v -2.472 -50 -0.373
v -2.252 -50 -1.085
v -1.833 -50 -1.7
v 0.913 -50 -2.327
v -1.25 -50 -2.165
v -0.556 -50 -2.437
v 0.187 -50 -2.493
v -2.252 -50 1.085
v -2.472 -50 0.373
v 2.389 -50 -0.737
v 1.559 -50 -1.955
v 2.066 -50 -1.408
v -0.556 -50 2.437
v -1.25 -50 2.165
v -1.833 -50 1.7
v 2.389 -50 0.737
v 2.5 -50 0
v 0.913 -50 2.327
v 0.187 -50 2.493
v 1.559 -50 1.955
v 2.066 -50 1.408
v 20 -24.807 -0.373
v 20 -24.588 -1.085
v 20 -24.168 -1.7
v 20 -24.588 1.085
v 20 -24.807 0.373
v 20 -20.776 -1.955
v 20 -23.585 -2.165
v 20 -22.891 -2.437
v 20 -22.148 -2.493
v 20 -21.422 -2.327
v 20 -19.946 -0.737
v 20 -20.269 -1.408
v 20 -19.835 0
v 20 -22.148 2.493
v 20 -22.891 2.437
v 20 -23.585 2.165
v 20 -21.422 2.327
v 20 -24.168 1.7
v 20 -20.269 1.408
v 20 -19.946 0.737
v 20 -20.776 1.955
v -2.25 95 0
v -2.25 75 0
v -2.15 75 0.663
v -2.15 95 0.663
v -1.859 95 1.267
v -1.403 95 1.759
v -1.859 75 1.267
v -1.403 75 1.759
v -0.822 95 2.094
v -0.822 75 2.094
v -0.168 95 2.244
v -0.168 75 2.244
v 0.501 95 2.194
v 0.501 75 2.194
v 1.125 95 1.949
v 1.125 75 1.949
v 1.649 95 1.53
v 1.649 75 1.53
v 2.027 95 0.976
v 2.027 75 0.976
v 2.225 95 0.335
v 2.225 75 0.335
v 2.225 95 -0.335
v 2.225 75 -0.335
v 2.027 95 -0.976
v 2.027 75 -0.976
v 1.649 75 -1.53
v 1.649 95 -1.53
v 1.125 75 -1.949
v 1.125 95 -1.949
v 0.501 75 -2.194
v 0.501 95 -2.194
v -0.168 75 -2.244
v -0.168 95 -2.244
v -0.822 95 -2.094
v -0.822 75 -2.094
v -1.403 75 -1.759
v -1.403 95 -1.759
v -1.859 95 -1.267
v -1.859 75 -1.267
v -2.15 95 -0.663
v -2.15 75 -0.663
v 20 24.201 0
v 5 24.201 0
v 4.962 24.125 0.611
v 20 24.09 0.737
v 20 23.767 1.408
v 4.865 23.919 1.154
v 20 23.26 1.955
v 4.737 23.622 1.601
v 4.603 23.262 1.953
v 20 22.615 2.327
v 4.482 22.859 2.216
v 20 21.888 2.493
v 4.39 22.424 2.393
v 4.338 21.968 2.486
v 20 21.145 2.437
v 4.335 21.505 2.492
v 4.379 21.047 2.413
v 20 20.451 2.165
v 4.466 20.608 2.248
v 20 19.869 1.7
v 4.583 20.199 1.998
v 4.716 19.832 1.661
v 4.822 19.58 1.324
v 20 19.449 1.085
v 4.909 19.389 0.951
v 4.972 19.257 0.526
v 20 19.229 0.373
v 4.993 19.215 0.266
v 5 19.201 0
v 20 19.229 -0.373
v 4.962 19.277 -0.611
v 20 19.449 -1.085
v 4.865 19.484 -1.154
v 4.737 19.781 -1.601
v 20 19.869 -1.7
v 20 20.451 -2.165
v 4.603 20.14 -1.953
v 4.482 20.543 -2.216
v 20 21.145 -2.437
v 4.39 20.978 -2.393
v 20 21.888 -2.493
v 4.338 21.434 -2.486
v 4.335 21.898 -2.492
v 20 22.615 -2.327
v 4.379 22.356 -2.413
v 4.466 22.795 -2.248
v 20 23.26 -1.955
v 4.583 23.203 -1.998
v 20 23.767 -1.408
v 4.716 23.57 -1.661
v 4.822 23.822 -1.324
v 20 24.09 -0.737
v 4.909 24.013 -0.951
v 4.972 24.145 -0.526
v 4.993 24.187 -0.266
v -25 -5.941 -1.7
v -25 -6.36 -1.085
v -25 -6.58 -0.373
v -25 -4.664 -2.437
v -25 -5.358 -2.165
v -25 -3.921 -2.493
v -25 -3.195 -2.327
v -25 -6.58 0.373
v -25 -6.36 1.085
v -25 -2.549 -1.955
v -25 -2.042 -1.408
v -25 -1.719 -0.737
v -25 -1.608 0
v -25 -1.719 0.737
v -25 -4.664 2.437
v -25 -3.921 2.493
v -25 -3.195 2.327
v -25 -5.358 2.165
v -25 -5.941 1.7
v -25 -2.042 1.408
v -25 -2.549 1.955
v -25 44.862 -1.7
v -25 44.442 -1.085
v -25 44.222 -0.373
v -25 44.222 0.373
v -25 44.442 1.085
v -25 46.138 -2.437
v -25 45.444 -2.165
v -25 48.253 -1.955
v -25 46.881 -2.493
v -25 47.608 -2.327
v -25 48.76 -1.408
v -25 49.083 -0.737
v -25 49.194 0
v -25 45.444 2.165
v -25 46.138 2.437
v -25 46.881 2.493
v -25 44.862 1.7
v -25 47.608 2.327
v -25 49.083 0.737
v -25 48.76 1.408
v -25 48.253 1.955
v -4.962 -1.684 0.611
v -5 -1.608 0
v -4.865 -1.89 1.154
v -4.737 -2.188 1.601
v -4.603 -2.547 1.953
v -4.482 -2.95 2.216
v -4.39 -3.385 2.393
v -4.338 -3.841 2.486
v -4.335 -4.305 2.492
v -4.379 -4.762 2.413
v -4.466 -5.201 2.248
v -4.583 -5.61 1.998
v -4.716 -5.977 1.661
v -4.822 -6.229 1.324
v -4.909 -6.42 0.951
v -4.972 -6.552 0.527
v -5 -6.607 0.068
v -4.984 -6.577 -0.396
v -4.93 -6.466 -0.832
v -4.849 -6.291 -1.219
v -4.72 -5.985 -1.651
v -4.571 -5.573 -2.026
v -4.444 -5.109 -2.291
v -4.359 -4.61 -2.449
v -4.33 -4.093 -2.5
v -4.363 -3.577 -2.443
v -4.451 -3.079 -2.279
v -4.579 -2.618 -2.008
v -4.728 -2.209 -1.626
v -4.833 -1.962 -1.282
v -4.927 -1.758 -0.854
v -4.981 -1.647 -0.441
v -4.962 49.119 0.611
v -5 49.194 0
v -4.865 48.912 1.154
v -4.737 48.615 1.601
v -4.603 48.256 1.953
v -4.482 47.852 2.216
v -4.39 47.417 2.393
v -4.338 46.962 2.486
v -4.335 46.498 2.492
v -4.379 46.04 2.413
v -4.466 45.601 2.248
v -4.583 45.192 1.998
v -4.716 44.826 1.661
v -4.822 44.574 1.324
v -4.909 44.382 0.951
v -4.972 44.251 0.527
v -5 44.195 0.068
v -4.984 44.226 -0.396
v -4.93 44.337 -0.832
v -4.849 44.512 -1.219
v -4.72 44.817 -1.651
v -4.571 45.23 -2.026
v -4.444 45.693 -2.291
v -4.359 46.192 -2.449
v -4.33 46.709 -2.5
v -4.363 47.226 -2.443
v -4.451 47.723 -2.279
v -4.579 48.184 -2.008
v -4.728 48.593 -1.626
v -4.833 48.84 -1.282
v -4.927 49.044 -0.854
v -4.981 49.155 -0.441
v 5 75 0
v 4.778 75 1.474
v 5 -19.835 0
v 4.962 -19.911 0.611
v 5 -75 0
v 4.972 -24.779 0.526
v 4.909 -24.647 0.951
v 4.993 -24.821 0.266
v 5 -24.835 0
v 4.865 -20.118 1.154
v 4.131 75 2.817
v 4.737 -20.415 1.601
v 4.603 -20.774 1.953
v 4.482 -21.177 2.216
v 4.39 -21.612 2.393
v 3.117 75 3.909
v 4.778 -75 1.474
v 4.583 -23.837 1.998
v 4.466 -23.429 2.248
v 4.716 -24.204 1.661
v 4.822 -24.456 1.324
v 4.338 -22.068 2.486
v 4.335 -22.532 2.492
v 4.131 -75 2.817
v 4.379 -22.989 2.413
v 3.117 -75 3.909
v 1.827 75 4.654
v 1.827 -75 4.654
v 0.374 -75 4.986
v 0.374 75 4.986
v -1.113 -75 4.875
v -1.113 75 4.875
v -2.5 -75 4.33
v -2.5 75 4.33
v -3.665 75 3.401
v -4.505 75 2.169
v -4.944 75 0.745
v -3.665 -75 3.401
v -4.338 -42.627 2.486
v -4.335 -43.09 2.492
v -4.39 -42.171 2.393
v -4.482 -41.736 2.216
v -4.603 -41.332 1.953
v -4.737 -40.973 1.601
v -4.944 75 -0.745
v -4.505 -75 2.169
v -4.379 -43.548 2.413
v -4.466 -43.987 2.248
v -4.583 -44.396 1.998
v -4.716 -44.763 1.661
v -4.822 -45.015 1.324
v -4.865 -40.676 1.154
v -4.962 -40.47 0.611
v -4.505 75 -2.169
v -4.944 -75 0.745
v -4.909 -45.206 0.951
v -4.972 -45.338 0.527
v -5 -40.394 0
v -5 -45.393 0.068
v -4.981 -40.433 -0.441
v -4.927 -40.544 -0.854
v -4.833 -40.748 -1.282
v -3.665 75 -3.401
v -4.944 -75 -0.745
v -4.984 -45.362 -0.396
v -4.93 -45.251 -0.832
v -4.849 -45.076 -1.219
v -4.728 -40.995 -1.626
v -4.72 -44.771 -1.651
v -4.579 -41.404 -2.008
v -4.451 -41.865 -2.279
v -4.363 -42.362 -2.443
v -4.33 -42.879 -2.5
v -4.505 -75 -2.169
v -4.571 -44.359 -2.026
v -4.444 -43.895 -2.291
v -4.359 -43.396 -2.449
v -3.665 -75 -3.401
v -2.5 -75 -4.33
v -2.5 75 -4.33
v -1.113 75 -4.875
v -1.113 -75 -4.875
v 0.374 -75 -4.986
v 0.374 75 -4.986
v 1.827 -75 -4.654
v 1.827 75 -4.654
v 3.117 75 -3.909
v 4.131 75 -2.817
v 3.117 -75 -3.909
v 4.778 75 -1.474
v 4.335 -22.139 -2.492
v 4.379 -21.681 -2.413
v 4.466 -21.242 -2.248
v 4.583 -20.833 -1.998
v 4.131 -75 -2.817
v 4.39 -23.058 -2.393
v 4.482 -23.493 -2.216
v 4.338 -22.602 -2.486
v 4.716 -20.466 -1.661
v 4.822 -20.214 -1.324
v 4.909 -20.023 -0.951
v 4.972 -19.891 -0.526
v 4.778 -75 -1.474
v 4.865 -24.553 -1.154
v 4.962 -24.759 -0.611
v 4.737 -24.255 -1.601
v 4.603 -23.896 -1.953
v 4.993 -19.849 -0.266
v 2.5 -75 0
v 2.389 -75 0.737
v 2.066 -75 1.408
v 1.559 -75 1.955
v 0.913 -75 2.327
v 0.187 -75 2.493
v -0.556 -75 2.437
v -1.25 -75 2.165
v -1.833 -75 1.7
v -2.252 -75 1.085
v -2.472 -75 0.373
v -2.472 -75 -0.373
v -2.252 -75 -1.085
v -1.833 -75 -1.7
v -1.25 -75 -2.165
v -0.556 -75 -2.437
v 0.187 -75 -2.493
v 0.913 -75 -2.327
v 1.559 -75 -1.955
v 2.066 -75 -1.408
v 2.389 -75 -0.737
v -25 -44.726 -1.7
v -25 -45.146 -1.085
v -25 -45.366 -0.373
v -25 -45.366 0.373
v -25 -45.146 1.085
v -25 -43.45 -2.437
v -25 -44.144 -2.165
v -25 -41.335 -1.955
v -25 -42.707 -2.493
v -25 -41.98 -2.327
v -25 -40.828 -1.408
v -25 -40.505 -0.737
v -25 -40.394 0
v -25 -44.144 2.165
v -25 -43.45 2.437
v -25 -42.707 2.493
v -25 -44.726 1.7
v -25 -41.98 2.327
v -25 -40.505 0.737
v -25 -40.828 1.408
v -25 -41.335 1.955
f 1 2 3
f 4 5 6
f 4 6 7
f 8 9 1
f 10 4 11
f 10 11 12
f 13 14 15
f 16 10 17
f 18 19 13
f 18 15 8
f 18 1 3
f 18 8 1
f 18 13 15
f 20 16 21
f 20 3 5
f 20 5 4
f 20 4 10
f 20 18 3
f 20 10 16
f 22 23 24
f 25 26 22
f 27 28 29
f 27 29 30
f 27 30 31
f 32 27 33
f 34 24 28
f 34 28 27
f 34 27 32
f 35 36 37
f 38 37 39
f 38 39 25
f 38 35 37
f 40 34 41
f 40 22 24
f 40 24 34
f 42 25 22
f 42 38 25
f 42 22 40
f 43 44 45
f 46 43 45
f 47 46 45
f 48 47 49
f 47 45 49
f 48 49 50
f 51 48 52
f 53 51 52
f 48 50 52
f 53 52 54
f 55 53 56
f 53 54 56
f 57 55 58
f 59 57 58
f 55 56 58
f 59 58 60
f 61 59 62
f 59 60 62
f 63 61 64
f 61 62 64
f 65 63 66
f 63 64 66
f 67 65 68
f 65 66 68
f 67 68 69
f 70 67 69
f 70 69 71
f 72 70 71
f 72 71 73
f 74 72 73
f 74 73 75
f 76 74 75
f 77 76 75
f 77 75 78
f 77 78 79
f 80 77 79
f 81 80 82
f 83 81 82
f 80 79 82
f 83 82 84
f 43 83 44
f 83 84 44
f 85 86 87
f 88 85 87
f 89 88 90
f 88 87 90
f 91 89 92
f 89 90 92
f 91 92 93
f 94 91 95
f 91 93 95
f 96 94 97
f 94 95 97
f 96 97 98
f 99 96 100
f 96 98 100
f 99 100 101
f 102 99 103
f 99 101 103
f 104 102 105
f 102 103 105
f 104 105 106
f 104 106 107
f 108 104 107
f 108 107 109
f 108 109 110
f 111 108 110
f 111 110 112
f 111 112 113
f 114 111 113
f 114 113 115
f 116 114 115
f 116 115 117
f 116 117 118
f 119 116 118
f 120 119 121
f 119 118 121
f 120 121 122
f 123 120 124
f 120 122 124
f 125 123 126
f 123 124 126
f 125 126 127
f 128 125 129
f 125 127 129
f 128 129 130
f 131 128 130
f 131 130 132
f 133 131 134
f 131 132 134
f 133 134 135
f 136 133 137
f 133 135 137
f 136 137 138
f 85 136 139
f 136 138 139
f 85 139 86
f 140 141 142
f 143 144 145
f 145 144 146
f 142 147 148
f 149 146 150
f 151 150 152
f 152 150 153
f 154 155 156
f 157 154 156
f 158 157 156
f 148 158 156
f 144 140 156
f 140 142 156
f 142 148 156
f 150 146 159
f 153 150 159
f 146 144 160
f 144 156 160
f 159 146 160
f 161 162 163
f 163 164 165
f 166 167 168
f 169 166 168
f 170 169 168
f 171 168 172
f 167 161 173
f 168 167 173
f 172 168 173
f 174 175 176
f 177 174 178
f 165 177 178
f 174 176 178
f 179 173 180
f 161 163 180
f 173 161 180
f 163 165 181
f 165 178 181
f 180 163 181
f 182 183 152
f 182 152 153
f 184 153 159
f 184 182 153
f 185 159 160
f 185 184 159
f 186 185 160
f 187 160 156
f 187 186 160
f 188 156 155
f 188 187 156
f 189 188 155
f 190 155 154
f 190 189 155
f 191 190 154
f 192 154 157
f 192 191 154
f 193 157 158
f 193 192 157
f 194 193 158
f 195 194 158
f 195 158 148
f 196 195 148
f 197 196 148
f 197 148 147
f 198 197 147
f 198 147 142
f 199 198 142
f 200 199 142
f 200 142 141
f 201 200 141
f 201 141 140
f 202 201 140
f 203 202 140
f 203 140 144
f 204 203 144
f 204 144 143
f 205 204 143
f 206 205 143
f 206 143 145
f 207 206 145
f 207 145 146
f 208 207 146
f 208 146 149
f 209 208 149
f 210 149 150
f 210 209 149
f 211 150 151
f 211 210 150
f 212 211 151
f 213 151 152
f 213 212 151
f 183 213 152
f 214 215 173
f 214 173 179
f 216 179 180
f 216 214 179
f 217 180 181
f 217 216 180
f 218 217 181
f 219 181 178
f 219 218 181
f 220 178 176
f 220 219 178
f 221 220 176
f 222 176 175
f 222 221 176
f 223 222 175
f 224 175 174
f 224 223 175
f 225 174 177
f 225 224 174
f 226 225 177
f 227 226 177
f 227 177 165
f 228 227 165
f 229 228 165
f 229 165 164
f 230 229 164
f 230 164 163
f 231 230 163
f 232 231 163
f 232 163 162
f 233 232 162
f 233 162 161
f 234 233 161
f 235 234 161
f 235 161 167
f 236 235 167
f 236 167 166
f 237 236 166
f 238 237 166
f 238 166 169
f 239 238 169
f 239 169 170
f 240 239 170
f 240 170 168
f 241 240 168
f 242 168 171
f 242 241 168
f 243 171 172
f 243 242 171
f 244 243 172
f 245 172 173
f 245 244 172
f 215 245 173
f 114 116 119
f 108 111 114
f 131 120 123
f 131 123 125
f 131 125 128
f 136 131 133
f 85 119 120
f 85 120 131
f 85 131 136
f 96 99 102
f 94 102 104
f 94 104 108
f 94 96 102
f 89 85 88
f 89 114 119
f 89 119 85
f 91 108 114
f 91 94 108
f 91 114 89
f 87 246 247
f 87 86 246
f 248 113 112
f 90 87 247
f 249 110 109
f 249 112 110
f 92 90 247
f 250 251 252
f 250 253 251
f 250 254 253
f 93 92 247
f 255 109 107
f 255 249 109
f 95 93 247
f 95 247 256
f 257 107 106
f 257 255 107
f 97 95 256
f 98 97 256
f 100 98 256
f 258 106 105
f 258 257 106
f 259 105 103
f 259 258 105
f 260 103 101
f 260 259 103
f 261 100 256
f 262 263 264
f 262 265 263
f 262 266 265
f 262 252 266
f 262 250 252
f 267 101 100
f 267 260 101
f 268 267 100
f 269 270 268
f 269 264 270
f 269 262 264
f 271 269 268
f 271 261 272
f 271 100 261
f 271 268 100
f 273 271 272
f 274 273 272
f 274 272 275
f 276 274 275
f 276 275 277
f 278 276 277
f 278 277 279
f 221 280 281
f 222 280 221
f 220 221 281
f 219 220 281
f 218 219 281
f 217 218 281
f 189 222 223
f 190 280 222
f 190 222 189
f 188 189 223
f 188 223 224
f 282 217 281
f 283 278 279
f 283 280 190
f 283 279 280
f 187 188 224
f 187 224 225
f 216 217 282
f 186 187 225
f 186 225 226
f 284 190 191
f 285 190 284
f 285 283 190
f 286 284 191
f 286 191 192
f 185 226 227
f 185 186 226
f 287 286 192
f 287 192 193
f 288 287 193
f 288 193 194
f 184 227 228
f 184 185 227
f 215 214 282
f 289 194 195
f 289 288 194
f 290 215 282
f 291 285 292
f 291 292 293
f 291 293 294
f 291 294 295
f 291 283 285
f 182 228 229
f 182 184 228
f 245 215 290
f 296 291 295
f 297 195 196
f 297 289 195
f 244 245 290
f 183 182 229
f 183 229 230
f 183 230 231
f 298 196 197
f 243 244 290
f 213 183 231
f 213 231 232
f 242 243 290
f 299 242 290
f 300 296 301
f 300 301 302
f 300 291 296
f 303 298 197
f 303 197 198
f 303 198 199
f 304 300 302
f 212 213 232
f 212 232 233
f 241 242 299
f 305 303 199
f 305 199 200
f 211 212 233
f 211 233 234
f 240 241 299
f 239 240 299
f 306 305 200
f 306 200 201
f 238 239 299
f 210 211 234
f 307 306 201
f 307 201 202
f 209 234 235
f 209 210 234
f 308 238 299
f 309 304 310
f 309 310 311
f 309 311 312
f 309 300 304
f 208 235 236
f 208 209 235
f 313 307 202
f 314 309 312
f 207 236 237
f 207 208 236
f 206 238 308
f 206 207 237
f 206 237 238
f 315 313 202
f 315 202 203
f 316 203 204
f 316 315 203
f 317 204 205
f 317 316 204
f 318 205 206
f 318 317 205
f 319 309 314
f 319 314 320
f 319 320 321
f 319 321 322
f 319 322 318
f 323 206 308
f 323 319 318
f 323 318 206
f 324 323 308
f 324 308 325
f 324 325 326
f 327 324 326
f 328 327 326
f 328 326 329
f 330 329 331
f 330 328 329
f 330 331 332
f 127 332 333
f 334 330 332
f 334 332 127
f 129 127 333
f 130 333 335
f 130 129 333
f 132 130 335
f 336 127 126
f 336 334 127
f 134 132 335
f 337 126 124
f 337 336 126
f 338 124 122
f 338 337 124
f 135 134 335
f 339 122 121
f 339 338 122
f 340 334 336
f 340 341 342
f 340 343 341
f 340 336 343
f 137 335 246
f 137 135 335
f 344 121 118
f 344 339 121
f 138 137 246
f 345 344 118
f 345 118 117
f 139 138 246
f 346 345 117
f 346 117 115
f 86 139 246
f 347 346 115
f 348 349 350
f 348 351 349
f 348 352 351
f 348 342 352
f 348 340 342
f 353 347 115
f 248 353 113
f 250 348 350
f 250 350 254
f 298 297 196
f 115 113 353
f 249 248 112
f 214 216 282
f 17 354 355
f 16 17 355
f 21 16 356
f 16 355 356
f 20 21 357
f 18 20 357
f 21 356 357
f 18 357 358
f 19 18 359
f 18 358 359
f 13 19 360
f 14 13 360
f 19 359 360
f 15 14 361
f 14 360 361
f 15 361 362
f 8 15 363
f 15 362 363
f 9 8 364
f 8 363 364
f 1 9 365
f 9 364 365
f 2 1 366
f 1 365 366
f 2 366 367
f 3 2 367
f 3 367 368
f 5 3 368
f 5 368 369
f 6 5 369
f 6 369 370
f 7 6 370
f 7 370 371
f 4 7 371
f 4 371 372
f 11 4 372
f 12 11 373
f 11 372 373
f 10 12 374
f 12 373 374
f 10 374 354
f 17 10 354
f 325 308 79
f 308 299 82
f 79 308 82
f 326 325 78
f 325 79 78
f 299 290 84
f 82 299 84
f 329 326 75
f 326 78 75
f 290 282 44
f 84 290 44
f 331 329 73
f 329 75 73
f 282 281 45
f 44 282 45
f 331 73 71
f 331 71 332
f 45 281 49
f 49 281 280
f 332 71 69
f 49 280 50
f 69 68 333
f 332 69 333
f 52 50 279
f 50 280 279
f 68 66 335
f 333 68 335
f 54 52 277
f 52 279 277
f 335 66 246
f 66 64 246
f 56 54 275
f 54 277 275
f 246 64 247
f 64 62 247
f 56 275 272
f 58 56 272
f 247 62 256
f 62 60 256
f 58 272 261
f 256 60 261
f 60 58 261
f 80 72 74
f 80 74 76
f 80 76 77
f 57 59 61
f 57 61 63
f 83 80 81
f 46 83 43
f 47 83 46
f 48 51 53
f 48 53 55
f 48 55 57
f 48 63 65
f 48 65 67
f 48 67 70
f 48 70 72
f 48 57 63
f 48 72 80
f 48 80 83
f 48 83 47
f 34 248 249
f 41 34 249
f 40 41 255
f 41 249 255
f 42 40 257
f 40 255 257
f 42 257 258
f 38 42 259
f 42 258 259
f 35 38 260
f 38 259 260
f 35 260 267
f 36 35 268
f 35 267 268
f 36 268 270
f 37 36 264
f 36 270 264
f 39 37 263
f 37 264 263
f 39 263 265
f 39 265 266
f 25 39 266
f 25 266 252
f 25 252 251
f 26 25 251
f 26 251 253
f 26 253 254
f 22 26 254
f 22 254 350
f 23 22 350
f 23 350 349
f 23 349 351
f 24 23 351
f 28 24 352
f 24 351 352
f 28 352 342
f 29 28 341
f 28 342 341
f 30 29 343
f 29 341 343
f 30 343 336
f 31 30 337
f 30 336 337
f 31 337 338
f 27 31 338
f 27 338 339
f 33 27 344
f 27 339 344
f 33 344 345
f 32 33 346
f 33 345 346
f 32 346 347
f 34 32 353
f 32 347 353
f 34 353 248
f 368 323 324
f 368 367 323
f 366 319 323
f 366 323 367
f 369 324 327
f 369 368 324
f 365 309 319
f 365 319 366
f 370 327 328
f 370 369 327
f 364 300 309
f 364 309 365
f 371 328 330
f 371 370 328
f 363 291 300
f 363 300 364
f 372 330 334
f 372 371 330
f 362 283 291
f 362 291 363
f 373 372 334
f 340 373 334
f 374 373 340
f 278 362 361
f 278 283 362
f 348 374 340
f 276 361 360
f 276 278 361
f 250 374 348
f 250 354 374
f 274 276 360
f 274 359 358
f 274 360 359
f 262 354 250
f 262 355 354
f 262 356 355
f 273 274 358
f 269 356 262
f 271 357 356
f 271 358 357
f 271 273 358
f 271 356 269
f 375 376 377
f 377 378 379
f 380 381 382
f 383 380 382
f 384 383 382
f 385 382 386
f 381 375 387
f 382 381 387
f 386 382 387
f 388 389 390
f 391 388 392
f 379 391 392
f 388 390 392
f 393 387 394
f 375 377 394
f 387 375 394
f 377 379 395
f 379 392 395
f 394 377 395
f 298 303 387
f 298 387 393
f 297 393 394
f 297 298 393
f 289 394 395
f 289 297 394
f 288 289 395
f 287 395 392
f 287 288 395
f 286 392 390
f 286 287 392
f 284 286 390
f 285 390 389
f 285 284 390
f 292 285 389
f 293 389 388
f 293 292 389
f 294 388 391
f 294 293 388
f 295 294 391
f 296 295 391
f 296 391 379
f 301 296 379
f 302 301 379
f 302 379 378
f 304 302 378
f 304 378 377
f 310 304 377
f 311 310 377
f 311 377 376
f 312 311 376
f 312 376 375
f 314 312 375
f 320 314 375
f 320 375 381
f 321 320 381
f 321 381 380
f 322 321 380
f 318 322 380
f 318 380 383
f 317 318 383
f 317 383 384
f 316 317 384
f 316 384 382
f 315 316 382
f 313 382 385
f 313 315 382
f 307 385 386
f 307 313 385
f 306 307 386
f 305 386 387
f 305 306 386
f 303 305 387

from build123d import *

# Parameters (mm, degrees)
F0_R     = 5
F1_DEPTH = 75
F2_R     = 2.5
F3_DEPTH = 25
F4_R     = 2.5
F5_DEPTH = 20
F6_R     = 2.25
F7_DEPTH = 20
F8_R     = 2.5
F9_DEPTH = 25


with BuildPart() as f1:
    # F0 (on Front) → F1 (new body, symmetric)
    with BuildSketch(Plane.XZ):
        Circle(F0_R)
    extrude(amount=F1_DEPTH, both=True)

    # F2 (on face) → F3 (cut)
    with BuildSketch(Plane.XZ.offset(75)):
        Circle(F2_R)
    extrude(amount=-F3_DEPTH, mode=Mode.SUBTRACT)

    # F4 (on Right) → F5 (join)
    with BuildSketch(Plane.YZ):
        with Locations((21.7011971159, 0)):
            Circle(F4_R)
        with Locations((-22.3350814088, 0)):
            Circle(F4_R)
    extrude(amount=F5_DEPTH)

    # F6 (on face) → F7 (join)
    with BuildSketch(Plane(origin=(0, 75, 0), x_dir=(-1, 0, 0), z_dir=(0, 1, 0))):
        Circle(F6_R)
    extrude(amount=F7_DEPTH)

    # F8 (on Right) → F9 (join)
    with BuildSketch(Plane.YZ):
        with Locations((46.6944500804, 0)):
            Circle(F8_R)
        with Locations((-4.1080172062, 0)):
            Circle(F8_R)
        with Locations((-42.8937412798, 0)):
            Circle(F8_R)
    extrude(amount=-F9_DEPTH)


solid = f1.part
